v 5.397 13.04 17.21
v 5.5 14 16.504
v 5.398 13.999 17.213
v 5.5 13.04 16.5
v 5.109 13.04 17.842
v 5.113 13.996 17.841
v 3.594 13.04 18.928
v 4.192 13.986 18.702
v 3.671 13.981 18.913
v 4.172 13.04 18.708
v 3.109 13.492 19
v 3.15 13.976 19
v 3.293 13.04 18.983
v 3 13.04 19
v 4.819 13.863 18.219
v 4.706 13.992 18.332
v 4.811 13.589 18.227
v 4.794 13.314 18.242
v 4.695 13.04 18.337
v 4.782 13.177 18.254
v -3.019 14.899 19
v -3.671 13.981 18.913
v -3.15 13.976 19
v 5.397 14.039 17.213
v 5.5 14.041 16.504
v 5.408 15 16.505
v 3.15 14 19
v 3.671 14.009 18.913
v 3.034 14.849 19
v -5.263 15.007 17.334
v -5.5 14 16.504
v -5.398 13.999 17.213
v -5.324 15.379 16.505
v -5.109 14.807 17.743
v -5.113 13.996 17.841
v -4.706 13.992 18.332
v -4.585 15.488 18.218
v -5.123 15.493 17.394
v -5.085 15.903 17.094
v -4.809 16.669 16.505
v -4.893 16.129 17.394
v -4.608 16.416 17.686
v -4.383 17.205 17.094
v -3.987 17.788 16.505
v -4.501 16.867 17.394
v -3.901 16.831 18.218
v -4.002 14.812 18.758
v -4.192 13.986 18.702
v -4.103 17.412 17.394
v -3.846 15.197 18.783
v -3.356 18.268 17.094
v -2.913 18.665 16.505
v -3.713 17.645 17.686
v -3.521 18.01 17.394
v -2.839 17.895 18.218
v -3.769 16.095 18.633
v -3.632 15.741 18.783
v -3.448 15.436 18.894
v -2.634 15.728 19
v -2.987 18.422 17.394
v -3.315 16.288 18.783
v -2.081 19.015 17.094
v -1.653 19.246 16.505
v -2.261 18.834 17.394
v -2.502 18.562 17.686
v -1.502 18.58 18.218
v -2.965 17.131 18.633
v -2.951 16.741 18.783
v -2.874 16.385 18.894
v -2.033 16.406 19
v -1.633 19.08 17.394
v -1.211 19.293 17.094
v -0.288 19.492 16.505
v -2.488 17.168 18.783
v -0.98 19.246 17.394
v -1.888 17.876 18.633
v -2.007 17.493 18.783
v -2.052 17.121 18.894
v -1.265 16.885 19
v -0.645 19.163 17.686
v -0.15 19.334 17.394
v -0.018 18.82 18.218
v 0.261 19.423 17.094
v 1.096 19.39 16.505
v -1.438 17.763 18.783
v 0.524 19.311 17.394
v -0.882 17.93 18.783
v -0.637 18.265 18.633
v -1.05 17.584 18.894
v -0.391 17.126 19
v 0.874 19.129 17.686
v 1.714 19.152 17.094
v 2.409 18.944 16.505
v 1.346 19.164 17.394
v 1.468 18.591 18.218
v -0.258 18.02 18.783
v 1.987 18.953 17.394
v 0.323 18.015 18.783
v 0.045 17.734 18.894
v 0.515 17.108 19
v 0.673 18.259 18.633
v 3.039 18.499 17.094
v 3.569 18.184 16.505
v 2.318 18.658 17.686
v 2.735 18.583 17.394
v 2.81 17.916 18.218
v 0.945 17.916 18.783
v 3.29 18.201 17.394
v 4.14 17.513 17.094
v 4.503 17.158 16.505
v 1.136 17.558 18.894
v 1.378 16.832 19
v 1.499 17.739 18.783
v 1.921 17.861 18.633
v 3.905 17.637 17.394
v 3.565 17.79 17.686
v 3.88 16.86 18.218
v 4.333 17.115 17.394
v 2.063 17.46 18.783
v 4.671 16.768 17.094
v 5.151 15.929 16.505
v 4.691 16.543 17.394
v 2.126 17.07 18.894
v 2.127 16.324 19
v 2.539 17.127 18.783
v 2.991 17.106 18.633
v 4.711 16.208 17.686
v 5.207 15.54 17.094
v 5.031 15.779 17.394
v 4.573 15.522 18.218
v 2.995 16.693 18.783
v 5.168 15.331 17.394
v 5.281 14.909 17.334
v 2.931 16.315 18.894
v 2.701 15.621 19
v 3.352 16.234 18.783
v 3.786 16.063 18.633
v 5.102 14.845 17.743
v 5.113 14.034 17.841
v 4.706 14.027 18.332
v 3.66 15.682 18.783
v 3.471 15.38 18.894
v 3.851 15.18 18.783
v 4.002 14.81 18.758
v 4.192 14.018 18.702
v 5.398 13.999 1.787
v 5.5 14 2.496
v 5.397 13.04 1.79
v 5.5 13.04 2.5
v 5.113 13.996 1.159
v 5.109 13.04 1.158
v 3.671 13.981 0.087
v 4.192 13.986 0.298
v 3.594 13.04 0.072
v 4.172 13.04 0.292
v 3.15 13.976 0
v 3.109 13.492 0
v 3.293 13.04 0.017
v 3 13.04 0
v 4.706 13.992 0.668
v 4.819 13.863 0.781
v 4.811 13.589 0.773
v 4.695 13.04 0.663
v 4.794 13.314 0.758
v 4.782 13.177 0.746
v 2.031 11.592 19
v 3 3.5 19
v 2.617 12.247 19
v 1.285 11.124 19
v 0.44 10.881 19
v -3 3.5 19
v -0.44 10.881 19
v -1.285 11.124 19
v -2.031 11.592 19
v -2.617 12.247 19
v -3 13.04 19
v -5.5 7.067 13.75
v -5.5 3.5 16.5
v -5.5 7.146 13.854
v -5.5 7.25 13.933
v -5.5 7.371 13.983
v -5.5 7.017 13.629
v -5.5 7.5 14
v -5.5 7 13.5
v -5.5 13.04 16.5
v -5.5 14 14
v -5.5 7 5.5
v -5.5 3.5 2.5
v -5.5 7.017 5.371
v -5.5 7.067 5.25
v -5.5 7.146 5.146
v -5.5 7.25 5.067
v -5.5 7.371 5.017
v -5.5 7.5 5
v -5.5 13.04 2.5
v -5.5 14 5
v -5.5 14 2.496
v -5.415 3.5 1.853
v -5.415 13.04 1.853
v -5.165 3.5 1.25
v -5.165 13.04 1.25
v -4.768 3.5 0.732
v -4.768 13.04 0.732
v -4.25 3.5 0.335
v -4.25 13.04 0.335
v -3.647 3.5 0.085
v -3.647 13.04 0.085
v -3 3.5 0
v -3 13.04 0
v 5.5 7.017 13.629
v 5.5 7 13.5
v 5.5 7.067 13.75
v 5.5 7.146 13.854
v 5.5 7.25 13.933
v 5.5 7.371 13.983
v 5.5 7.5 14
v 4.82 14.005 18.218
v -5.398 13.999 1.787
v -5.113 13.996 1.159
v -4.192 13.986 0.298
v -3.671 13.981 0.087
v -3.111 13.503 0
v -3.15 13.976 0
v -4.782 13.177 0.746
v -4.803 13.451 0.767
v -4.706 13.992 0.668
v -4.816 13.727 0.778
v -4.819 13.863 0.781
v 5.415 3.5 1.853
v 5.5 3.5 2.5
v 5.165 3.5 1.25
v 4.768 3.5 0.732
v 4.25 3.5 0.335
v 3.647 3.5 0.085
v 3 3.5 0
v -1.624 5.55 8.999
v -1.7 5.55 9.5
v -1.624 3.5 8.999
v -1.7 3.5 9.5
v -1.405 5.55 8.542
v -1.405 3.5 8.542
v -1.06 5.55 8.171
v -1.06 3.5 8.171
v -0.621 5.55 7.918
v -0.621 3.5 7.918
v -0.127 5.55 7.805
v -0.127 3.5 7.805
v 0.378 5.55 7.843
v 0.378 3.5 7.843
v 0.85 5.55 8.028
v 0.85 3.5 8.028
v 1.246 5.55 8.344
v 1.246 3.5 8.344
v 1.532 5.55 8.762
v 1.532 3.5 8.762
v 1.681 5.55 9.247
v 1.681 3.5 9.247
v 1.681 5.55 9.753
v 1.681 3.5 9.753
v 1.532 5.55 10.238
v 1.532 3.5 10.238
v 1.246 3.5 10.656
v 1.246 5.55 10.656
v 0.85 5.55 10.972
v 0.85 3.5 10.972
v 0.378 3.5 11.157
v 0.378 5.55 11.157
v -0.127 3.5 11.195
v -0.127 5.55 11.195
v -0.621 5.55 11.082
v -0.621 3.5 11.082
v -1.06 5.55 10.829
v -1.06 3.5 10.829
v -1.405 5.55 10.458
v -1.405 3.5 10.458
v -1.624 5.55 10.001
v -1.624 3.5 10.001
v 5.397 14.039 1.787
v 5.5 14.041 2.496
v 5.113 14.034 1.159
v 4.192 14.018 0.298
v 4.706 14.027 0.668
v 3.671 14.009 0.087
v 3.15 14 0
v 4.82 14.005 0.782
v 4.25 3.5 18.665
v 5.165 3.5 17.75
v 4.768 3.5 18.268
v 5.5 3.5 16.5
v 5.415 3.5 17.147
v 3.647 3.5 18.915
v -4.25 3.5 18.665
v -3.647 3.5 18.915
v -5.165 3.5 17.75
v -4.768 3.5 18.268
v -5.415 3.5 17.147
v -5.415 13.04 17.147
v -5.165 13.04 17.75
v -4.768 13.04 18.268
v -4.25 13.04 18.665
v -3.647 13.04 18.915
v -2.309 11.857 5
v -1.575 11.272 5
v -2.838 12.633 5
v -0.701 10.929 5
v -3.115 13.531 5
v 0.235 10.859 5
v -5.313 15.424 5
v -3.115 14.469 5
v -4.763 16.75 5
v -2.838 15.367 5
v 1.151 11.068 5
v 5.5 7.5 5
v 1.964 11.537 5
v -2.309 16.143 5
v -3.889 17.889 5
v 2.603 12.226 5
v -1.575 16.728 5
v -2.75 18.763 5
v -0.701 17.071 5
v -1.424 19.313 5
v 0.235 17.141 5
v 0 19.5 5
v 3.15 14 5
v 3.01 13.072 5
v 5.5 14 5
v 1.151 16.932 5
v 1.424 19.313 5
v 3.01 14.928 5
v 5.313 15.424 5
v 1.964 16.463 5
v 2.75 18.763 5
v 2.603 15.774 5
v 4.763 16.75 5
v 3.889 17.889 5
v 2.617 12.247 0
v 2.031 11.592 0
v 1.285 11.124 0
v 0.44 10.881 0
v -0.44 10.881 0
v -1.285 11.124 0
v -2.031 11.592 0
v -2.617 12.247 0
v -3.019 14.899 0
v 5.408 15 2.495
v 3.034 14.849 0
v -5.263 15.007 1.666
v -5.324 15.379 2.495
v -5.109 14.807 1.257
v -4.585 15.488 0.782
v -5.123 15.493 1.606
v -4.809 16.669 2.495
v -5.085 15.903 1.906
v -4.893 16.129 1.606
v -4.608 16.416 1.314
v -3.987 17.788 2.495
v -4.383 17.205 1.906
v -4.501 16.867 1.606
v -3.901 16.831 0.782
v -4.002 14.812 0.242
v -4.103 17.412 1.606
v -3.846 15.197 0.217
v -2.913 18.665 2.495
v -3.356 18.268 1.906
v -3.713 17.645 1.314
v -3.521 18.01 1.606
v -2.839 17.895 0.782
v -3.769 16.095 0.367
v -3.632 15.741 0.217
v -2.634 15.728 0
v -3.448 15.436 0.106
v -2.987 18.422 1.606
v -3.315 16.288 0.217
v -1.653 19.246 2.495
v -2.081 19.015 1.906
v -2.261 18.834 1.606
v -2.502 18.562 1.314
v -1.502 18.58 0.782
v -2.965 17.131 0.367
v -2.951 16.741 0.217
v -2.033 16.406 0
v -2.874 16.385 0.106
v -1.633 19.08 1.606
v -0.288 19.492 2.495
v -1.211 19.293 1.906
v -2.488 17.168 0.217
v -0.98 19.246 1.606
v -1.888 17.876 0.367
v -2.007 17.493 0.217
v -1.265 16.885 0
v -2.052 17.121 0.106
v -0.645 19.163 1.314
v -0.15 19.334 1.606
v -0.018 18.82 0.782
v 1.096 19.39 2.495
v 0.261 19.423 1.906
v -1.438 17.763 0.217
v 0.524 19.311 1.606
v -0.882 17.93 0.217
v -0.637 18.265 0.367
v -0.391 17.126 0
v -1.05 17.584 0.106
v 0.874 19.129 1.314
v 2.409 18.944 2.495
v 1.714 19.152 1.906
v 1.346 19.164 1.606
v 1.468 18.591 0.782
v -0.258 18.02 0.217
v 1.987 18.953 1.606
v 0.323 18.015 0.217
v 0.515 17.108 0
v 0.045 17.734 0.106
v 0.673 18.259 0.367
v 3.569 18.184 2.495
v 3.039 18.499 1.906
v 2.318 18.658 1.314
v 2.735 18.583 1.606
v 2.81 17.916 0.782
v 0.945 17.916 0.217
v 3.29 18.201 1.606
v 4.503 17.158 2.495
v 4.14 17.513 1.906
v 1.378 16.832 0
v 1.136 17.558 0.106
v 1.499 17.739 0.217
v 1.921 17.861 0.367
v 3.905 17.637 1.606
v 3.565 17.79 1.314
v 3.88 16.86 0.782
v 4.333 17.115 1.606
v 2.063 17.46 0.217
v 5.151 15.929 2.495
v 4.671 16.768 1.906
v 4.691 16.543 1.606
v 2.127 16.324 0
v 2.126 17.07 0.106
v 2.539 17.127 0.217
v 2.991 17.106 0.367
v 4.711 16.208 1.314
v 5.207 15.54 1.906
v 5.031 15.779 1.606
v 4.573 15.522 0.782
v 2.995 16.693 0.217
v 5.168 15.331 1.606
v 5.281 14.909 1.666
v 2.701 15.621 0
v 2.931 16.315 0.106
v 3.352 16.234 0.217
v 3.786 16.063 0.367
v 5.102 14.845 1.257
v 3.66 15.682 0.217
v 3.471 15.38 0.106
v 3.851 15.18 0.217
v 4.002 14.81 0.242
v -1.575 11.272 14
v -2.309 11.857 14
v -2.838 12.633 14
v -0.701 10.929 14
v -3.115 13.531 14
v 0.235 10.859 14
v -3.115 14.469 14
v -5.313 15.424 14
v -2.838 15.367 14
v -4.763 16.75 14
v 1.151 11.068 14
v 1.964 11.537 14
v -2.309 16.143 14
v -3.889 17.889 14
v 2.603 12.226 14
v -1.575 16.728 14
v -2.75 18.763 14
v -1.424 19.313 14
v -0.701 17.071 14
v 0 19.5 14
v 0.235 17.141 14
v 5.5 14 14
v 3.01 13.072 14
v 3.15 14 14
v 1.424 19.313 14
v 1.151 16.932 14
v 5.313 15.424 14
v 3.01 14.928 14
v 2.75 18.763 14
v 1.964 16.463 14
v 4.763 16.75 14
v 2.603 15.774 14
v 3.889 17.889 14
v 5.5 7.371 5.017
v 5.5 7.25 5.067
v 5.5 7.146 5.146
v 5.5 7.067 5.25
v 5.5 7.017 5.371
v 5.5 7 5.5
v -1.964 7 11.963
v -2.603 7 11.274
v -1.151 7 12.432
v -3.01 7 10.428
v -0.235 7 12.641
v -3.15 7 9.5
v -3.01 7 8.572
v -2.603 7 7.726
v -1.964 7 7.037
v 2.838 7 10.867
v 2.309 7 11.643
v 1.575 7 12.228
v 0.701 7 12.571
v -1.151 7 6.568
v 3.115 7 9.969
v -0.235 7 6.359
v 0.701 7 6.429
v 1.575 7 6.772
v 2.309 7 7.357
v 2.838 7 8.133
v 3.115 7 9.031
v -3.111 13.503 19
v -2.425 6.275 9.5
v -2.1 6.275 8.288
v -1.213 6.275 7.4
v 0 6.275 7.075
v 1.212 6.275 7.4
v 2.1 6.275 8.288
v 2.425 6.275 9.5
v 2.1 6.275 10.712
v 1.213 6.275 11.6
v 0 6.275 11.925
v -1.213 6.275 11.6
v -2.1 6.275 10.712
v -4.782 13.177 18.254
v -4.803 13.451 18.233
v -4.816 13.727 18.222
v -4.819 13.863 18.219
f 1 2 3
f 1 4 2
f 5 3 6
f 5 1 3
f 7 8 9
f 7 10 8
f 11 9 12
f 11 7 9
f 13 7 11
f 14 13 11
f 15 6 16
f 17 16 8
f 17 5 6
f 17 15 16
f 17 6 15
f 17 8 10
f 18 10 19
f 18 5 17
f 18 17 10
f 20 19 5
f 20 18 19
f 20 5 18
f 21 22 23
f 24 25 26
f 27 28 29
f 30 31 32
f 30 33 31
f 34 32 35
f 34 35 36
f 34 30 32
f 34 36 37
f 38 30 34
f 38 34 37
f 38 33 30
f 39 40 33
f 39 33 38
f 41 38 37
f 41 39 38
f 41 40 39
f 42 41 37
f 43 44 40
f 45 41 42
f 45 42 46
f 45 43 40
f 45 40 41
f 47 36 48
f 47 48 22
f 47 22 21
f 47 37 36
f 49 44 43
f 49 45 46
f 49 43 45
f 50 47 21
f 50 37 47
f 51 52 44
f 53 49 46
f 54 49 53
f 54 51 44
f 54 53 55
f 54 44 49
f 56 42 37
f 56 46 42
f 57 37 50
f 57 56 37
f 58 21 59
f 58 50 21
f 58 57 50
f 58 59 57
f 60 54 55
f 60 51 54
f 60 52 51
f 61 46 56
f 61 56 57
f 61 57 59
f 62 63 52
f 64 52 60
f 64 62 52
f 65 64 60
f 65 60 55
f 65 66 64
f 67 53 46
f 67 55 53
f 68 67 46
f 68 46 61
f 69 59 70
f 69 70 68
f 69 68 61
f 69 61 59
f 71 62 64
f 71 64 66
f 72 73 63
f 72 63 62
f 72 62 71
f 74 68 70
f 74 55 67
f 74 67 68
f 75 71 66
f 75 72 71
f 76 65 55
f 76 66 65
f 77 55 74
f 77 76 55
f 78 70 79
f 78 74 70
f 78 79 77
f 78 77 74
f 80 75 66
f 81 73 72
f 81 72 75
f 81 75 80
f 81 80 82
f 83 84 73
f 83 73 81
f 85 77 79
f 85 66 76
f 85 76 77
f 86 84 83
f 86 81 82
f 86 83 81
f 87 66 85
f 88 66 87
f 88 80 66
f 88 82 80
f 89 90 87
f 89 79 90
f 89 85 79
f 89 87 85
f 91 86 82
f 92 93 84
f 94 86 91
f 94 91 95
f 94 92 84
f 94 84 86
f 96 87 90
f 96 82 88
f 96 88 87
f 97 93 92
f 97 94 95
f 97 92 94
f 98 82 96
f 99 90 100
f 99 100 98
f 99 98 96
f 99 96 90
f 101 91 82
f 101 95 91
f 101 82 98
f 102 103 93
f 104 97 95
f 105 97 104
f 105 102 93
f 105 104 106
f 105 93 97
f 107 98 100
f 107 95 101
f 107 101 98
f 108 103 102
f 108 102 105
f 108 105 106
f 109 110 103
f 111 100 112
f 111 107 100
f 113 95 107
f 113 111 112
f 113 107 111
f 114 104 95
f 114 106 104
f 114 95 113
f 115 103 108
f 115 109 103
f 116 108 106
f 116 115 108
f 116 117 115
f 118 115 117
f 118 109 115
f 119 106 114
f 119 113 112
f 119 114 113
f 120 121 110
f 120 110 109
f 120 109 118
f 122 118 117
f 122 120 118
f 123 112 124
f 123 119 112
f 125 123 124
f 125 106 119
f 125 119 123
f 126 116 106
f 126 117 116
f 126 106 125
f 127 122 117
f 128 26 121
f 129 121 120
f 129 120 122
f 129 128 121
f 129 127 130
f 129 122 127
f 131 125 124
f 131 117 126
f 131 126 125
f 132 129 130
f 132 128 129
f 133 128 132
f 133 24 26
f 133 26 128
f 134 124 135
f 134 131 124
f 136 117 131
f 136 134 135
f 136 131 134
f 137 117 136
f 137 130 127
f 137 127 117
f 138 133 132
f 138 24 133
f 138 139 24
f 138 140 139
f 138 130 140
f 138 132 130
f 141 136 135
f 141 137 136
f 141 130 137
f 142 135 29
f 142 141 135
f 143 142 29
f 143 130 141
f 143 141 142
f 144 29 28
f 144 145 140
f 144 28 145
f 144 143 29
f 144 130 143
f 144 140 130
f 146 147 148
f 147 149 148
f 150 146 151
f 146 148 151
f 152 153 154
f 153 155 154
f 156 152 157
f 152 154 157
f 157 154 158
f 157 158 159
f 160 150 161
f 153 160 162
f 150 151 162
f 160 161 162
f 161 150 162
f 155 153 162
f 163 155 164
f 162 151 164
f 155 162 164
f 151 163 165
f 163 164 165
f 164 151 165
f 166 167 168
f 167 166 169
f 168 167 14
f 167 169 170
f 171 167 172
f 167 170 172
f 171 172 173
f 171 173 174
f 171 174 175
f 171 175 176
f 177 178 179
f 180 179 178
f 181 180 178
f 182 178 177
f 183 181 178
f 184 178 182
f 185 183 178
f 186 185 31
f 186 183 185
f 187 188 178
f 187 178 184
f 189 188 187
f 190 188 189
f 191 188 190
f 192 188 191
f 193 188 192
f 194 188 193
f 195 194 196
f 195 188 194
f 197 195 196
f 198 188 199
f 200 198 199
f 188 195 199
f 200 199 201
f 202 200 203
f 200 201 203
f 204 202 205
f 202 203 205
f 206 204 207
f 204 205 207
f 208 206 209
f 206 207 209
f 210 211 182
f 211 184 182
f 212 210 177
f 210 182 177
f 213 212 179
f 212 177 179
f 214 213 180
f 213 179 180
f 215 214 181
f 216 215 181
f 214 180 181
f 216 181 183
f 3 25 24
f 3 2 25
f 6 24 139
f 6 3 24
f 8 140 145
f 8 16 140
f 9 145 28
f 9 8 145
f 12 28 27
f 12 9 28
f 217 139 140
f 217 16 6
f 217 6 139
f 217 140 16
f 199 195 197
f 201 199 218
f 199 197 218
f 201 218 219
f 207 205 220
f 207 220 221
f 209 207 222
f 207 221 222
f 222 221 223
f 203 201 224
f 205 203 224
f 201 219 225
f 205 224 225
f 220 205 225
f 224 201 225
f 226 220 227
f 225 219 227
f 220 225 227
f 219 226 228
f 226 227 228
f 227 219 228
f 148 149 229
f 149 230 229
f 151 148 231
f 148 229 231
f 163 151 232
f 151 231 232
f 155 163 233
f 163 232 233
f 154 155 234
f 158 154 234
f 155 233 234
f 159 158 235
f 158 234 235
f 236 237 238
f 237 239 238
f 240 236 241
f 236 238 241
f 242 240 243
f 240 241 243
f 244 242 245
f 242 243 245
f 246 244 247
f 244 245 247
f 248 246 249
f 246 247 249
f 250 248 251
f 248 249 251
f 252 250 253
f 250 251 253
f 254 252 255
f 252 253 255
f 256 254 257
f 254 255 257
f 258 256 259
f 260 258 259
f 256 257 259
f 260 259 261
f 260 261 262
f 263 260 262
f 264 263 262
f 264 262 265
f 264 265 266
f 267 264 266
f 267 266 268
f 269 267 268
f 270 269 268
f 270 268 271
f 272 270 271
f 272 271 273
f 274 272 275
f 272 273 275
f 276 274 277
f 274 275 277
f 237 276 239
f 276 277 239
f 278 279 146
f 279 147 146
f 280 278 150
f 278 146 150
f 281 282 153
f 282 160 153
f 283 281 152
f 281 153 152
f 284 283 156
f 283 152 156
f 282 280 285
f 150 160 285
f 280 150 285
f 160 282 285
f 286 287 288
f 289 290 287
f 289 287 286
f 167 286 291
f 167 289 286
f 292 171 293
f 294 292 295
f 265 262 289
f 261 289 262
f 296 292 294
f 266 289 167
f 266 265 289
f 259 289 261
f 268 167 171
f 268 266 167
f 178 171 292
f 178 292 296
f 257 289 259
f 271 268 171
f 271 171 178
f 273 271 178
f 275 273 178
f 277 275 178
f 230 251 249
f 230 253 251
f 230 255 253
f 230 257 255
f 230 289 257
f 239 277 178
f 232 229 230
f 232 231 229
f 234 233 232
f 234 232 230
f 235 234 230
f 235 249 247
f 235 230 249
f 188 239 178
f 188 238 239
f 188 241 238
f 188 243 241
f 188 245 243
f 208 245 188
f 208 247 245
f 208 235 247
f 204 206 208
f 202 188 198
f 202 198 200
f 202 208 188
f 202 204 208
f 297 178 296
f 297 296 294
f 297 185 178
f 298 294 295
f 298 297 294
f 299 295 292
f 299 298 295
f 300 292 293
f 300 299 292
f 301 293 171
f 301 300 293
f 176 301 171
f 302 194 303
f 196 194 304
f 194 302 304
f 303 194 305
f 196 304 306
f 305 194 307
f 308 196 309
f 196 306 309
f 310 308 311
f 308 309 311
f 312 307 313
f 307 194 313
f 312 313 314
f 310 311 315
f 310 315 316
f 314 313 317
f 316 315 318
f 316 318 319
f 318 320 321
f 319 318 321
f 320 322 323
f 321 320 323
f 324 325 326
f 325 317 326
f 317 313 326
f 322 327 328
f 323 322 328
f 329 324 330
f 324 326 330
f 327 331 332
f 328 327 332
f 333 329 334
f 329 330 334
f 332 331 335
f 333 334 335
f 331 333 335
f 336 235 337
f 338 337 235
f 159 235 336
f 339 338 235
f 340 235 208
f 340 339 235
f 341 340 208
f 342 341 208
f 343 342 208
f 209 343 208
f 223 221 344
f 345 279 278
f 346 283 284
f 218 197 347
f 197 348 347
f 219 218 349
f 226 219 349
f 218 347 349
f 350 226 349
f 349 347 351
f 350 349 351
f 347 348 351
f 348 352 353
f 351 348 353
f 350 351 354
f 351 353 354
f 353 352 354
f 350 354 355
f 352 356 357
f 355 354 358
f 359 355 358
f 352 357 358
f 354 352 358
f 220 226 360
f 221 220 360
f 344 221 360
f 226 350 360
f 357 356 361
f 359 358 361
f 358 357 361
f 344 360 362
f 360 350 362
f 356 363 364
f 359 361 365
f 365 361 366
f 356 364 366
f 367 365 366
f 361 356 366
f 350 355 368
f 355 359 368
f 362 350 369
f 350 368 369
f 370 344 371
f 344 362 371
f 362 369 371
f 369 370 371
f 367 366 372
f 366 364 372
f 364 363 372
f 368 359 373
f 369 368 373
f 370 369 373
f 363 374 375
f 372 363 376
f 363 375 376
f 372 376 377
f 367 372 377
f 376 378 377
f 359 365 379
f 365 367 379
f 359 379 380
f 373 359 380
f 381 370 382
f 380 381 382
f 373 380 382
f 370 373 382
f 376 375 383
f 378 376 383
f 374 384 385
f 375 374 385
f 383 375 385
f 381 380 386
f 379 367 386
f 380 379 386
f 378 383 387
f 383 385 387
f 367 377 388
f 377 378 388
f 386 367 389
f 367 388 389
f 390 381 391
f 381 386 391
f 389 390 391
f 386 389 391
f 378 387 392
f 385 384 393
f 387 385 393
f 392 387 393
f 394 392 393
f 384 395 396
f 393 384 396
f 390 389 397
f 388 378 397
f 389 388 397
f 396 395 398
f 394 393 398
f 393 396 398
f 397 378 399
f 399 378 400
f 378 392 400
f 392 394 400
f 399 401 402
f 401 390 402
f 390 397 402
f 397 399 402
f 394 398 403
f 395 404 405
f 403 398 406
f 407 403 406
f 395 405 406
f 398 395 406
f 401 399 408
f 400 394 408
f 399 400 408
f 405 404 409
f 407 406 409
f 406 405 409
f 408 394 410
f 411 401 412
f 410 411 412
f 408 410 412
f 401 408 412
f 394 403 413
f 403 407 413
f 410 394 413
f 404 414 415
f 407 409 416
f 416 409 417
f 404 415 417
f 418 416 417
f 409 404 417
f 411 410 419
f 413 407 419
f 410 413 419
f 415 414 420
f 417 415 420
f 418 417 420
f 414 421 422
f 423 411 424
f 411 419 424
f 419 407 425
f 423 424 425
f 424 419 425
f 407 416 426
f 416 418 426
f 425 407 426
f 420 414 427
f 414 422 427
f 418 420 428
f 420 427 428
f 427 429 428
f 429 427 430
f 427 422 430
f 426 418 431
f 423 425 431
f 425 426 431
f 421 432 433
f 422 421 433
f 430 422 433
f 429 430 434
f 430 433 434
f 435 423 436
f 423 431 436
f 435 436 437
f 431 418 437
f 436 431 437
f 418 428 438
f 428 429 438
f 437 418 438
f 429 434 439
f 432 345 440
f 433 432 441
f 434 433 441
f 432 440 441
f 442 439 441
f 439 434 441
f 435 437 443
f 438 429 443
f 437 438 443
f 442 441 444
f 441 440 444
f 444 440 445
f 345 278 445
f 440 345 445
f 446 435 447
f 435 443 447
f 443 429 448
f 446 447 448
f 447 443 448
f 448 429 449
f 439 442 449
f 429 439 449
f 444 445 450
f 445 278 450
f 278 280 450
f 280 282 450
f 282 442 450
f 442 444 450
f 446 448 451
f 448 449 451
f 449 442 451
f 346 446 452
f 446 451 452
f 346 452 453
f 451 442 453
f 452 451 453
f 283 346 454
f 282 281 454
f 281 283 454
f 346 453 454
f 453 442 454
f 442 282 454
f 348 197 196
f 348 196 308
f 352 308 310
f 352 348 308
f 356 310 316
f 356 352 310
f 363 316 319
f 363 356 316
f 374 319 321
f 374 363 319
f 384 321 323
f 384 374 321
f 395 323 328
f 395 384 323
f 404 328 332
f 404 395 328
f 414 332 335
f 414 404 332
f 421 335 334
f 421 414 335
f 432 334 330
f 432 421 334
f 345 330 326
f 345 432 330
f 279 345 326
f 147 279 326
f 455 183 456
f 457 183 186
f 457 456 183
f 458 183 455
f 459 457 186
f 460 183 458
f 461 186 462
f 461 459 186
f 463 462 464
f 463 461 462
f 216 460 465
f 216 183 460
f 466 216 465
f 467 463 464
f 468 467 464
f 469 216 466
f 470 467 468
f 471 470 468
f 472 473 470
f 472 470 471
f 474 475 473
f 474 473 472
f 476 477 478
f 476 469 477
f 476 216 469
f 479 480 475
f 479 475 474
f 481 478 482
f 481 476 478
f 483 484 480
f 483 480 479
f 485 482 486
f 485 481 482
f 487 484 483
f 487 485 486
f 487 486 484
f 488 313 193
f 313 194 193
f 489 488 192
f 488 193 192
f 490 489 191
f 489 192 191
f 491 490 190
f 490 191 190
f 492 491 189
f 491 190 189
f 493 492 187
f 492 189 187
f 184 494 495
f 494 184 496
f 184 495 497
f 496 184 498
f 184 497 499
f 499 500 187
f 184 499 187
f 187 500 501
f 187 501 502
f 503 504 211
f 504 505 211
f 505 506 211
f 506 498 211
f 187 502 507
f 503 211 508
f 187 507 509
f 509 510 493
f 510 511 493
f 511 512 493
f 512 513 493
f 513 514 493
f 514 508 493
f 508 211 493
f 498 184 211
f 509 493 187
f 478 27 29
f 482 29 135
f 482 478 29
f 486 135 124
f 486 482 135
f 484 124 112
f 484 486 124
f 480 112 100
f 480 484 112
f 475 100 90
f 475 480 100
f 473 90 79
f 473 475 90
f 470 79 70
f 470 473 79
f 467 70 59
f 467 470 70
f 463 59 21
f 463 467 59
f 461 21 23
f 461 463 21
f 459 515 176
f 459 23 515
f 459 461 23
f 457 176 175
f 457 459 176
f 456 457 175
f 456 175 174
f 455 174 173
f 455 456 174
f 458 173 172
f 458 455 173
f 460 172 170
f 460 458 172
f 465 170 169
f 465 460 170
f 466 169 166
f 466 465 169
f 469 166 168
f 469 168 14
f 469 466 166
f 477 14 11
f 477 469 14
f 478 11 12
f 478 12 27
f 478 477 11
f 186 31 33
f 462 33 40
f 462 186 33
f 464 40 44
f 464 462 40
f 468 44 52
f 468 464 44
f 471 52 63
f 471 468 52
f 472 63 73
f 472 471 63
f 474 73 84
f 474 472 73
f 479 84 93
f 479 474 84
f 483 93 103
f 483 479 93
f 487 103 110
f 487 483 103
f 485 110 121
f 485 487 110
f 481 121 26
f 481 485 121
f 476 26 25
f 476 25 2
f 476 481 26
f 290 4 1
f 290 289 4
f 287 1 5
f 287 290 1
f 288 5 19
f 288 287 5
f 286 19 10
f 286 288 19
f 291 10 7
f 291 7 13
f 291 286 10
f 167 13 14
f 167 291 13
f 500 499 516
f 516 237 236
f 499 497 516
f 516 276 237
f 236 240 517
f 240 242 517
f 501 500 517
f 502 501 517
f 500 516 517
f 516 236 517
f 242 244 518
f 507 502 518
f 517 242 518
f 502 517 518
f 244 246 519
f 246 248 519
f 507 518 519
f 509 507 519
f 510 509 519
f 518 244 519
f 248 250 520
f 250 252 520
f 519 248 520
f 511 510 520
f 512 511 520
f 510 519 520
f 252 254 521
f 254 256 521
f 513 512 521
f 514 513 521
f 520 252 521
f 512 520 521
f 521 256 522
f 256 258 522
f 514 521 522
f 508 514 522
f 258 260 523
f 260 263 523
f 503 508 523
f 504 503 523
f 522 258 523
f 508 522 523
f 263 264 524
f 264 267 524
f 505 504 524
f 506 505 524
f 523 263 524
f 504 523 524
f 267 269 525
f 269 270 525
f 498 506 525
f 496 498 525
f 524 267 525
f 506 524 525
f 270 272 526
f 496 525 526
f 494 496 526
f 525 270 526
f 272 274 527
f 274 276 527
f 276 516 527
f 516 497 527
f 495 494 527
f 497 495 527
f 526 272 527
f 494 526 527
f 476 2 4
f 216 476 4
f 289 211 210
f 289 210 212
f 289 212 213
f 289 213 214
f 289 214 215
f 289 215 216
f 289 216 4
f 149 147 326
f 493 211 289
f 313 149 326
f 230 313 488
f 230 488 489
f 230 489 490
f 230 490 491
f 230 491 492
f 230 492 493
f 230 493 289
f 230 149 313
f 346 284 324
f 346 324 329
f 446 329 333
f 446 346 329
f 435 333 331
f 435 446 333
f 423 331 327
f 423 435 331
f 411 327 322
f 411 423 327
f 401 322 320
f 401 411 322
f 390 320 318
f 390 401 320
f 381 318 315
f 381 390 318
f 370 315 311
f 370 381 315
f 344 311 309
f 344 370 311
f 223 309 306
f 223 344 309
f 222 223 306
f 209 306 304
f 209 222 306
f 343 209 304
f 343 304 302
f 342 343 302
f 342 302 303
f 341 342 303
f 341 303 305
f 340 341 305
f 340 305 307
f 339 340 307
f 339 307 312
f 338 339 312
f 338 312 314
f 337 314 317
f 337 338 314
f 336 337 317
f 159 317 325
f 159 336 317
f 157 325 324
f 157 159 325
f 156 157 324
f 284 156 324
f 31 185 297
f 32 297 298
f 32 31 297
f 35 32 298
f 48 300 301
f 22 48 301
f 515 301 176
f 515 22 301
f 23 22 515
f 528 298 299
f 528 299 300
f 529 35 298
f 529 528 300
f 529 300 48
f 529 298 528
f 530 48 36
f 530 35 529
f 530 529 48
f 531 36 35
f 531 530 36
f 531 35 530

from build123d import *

# Parameters (mm, degrees)
ESQUISSE1_R                                    = 3.15
BOSS_EXTRU_1_DEPTH                             = 19
ESQUISSE2_W                                    = 9
ESQUISSE2_H                                    = 12.5
ENL_V_MAT_EXTRU_1_DEPTH                        = 15
FRAISAGE_POUR_VIS_T_TE_FRAIS_E_M31_D           = 3.4
FRAISAGE_POUR_VIS_T_TE_FRAIS_E_M31_CSINK_D     = 6.3
FRAISAGE_POUR_VIS_T_TE_FRAIS_E_M31_CSINK_ANGLE = 90
CONG_1_R                                       = 2.5
CONG_2_R                                       = 0.5


with BuildPart() as part:
    # Esquisse1 → Boss.-Extru.1 (new body)
    with BuildSketch(Plane.XY):
        with BuildLine():
            Line((-5.5, 3.5), (-5.5, 14))
            ThreePointArc((-5.5, 14), (0, 19.5), (5.5, 14))
            Line((5.5, 14), (5.5, 3.5))
            Line((5.5, 3.5), (-5.5, 3.5))
        make_face()
        with Locations((0, 14)):
            Circle(ESQUISSE1_R, mode=Mode.SUBTRACT)
    extrude(amount=BOSS_EXTRU_1_DEPTH)

    # Esquisse2 → Enlèv. mat.-Extru.1 (cut)
    with BuildSketch(Plane(origin=(5.5, 0, 0), x_dir=(0, 0, -1), z_dir=(1, 0, 0))):
        with Locations((-9.5, 13.25)):
            Rectangle(ESQUISSE2_W, ESQUISSE2_H)
    extrude(amount=-ENL_V_MAT_EXTRU_1_DEPTH, mode=Mode.SUBTRACT)

    # Fraisage pour vis à tête fraisée M31 (through all)
    with Locations(Plane(origin=(0, 7, 0), x_dir=(1, 0, 0), z_dir=(0, 1, 0))):
        with Locations((0, -9.5)):
            CounterSinkHole(FRAISAGE_POUR_VIS_T_TE_FRAIS_E_M31_D / 2, FRAISAGE_POUR_VIS_T_TE_FRAIS_E_M31_CSINK_D / 2, counter_sink_angle=FRAISAGE_POUR_VIS_T_TE_FRAIS_E_M31_CSINK_ANGLE)

    # Congé1
    cong_1_edges = [part.edges().sort_by_distance(p)[0] for p in [
        (5.5, 8.75, 0),
        (5.5, 8.75, 19),
        (-5.5, 8.75, 19),
        (-5.5, 8.75, 0),
    ]]
    fillet(cong_1_edges, radius=CONG_1_R)

    # Congé2
    cong_2_edges = [part.edges().sort_by_distance(p)[0] for p in [
        (0, 7, 14),
        (0, 7, 5),
    ]]
    fillet(cong_2_edges, radius=CONG_2_R)


solid = part.part
